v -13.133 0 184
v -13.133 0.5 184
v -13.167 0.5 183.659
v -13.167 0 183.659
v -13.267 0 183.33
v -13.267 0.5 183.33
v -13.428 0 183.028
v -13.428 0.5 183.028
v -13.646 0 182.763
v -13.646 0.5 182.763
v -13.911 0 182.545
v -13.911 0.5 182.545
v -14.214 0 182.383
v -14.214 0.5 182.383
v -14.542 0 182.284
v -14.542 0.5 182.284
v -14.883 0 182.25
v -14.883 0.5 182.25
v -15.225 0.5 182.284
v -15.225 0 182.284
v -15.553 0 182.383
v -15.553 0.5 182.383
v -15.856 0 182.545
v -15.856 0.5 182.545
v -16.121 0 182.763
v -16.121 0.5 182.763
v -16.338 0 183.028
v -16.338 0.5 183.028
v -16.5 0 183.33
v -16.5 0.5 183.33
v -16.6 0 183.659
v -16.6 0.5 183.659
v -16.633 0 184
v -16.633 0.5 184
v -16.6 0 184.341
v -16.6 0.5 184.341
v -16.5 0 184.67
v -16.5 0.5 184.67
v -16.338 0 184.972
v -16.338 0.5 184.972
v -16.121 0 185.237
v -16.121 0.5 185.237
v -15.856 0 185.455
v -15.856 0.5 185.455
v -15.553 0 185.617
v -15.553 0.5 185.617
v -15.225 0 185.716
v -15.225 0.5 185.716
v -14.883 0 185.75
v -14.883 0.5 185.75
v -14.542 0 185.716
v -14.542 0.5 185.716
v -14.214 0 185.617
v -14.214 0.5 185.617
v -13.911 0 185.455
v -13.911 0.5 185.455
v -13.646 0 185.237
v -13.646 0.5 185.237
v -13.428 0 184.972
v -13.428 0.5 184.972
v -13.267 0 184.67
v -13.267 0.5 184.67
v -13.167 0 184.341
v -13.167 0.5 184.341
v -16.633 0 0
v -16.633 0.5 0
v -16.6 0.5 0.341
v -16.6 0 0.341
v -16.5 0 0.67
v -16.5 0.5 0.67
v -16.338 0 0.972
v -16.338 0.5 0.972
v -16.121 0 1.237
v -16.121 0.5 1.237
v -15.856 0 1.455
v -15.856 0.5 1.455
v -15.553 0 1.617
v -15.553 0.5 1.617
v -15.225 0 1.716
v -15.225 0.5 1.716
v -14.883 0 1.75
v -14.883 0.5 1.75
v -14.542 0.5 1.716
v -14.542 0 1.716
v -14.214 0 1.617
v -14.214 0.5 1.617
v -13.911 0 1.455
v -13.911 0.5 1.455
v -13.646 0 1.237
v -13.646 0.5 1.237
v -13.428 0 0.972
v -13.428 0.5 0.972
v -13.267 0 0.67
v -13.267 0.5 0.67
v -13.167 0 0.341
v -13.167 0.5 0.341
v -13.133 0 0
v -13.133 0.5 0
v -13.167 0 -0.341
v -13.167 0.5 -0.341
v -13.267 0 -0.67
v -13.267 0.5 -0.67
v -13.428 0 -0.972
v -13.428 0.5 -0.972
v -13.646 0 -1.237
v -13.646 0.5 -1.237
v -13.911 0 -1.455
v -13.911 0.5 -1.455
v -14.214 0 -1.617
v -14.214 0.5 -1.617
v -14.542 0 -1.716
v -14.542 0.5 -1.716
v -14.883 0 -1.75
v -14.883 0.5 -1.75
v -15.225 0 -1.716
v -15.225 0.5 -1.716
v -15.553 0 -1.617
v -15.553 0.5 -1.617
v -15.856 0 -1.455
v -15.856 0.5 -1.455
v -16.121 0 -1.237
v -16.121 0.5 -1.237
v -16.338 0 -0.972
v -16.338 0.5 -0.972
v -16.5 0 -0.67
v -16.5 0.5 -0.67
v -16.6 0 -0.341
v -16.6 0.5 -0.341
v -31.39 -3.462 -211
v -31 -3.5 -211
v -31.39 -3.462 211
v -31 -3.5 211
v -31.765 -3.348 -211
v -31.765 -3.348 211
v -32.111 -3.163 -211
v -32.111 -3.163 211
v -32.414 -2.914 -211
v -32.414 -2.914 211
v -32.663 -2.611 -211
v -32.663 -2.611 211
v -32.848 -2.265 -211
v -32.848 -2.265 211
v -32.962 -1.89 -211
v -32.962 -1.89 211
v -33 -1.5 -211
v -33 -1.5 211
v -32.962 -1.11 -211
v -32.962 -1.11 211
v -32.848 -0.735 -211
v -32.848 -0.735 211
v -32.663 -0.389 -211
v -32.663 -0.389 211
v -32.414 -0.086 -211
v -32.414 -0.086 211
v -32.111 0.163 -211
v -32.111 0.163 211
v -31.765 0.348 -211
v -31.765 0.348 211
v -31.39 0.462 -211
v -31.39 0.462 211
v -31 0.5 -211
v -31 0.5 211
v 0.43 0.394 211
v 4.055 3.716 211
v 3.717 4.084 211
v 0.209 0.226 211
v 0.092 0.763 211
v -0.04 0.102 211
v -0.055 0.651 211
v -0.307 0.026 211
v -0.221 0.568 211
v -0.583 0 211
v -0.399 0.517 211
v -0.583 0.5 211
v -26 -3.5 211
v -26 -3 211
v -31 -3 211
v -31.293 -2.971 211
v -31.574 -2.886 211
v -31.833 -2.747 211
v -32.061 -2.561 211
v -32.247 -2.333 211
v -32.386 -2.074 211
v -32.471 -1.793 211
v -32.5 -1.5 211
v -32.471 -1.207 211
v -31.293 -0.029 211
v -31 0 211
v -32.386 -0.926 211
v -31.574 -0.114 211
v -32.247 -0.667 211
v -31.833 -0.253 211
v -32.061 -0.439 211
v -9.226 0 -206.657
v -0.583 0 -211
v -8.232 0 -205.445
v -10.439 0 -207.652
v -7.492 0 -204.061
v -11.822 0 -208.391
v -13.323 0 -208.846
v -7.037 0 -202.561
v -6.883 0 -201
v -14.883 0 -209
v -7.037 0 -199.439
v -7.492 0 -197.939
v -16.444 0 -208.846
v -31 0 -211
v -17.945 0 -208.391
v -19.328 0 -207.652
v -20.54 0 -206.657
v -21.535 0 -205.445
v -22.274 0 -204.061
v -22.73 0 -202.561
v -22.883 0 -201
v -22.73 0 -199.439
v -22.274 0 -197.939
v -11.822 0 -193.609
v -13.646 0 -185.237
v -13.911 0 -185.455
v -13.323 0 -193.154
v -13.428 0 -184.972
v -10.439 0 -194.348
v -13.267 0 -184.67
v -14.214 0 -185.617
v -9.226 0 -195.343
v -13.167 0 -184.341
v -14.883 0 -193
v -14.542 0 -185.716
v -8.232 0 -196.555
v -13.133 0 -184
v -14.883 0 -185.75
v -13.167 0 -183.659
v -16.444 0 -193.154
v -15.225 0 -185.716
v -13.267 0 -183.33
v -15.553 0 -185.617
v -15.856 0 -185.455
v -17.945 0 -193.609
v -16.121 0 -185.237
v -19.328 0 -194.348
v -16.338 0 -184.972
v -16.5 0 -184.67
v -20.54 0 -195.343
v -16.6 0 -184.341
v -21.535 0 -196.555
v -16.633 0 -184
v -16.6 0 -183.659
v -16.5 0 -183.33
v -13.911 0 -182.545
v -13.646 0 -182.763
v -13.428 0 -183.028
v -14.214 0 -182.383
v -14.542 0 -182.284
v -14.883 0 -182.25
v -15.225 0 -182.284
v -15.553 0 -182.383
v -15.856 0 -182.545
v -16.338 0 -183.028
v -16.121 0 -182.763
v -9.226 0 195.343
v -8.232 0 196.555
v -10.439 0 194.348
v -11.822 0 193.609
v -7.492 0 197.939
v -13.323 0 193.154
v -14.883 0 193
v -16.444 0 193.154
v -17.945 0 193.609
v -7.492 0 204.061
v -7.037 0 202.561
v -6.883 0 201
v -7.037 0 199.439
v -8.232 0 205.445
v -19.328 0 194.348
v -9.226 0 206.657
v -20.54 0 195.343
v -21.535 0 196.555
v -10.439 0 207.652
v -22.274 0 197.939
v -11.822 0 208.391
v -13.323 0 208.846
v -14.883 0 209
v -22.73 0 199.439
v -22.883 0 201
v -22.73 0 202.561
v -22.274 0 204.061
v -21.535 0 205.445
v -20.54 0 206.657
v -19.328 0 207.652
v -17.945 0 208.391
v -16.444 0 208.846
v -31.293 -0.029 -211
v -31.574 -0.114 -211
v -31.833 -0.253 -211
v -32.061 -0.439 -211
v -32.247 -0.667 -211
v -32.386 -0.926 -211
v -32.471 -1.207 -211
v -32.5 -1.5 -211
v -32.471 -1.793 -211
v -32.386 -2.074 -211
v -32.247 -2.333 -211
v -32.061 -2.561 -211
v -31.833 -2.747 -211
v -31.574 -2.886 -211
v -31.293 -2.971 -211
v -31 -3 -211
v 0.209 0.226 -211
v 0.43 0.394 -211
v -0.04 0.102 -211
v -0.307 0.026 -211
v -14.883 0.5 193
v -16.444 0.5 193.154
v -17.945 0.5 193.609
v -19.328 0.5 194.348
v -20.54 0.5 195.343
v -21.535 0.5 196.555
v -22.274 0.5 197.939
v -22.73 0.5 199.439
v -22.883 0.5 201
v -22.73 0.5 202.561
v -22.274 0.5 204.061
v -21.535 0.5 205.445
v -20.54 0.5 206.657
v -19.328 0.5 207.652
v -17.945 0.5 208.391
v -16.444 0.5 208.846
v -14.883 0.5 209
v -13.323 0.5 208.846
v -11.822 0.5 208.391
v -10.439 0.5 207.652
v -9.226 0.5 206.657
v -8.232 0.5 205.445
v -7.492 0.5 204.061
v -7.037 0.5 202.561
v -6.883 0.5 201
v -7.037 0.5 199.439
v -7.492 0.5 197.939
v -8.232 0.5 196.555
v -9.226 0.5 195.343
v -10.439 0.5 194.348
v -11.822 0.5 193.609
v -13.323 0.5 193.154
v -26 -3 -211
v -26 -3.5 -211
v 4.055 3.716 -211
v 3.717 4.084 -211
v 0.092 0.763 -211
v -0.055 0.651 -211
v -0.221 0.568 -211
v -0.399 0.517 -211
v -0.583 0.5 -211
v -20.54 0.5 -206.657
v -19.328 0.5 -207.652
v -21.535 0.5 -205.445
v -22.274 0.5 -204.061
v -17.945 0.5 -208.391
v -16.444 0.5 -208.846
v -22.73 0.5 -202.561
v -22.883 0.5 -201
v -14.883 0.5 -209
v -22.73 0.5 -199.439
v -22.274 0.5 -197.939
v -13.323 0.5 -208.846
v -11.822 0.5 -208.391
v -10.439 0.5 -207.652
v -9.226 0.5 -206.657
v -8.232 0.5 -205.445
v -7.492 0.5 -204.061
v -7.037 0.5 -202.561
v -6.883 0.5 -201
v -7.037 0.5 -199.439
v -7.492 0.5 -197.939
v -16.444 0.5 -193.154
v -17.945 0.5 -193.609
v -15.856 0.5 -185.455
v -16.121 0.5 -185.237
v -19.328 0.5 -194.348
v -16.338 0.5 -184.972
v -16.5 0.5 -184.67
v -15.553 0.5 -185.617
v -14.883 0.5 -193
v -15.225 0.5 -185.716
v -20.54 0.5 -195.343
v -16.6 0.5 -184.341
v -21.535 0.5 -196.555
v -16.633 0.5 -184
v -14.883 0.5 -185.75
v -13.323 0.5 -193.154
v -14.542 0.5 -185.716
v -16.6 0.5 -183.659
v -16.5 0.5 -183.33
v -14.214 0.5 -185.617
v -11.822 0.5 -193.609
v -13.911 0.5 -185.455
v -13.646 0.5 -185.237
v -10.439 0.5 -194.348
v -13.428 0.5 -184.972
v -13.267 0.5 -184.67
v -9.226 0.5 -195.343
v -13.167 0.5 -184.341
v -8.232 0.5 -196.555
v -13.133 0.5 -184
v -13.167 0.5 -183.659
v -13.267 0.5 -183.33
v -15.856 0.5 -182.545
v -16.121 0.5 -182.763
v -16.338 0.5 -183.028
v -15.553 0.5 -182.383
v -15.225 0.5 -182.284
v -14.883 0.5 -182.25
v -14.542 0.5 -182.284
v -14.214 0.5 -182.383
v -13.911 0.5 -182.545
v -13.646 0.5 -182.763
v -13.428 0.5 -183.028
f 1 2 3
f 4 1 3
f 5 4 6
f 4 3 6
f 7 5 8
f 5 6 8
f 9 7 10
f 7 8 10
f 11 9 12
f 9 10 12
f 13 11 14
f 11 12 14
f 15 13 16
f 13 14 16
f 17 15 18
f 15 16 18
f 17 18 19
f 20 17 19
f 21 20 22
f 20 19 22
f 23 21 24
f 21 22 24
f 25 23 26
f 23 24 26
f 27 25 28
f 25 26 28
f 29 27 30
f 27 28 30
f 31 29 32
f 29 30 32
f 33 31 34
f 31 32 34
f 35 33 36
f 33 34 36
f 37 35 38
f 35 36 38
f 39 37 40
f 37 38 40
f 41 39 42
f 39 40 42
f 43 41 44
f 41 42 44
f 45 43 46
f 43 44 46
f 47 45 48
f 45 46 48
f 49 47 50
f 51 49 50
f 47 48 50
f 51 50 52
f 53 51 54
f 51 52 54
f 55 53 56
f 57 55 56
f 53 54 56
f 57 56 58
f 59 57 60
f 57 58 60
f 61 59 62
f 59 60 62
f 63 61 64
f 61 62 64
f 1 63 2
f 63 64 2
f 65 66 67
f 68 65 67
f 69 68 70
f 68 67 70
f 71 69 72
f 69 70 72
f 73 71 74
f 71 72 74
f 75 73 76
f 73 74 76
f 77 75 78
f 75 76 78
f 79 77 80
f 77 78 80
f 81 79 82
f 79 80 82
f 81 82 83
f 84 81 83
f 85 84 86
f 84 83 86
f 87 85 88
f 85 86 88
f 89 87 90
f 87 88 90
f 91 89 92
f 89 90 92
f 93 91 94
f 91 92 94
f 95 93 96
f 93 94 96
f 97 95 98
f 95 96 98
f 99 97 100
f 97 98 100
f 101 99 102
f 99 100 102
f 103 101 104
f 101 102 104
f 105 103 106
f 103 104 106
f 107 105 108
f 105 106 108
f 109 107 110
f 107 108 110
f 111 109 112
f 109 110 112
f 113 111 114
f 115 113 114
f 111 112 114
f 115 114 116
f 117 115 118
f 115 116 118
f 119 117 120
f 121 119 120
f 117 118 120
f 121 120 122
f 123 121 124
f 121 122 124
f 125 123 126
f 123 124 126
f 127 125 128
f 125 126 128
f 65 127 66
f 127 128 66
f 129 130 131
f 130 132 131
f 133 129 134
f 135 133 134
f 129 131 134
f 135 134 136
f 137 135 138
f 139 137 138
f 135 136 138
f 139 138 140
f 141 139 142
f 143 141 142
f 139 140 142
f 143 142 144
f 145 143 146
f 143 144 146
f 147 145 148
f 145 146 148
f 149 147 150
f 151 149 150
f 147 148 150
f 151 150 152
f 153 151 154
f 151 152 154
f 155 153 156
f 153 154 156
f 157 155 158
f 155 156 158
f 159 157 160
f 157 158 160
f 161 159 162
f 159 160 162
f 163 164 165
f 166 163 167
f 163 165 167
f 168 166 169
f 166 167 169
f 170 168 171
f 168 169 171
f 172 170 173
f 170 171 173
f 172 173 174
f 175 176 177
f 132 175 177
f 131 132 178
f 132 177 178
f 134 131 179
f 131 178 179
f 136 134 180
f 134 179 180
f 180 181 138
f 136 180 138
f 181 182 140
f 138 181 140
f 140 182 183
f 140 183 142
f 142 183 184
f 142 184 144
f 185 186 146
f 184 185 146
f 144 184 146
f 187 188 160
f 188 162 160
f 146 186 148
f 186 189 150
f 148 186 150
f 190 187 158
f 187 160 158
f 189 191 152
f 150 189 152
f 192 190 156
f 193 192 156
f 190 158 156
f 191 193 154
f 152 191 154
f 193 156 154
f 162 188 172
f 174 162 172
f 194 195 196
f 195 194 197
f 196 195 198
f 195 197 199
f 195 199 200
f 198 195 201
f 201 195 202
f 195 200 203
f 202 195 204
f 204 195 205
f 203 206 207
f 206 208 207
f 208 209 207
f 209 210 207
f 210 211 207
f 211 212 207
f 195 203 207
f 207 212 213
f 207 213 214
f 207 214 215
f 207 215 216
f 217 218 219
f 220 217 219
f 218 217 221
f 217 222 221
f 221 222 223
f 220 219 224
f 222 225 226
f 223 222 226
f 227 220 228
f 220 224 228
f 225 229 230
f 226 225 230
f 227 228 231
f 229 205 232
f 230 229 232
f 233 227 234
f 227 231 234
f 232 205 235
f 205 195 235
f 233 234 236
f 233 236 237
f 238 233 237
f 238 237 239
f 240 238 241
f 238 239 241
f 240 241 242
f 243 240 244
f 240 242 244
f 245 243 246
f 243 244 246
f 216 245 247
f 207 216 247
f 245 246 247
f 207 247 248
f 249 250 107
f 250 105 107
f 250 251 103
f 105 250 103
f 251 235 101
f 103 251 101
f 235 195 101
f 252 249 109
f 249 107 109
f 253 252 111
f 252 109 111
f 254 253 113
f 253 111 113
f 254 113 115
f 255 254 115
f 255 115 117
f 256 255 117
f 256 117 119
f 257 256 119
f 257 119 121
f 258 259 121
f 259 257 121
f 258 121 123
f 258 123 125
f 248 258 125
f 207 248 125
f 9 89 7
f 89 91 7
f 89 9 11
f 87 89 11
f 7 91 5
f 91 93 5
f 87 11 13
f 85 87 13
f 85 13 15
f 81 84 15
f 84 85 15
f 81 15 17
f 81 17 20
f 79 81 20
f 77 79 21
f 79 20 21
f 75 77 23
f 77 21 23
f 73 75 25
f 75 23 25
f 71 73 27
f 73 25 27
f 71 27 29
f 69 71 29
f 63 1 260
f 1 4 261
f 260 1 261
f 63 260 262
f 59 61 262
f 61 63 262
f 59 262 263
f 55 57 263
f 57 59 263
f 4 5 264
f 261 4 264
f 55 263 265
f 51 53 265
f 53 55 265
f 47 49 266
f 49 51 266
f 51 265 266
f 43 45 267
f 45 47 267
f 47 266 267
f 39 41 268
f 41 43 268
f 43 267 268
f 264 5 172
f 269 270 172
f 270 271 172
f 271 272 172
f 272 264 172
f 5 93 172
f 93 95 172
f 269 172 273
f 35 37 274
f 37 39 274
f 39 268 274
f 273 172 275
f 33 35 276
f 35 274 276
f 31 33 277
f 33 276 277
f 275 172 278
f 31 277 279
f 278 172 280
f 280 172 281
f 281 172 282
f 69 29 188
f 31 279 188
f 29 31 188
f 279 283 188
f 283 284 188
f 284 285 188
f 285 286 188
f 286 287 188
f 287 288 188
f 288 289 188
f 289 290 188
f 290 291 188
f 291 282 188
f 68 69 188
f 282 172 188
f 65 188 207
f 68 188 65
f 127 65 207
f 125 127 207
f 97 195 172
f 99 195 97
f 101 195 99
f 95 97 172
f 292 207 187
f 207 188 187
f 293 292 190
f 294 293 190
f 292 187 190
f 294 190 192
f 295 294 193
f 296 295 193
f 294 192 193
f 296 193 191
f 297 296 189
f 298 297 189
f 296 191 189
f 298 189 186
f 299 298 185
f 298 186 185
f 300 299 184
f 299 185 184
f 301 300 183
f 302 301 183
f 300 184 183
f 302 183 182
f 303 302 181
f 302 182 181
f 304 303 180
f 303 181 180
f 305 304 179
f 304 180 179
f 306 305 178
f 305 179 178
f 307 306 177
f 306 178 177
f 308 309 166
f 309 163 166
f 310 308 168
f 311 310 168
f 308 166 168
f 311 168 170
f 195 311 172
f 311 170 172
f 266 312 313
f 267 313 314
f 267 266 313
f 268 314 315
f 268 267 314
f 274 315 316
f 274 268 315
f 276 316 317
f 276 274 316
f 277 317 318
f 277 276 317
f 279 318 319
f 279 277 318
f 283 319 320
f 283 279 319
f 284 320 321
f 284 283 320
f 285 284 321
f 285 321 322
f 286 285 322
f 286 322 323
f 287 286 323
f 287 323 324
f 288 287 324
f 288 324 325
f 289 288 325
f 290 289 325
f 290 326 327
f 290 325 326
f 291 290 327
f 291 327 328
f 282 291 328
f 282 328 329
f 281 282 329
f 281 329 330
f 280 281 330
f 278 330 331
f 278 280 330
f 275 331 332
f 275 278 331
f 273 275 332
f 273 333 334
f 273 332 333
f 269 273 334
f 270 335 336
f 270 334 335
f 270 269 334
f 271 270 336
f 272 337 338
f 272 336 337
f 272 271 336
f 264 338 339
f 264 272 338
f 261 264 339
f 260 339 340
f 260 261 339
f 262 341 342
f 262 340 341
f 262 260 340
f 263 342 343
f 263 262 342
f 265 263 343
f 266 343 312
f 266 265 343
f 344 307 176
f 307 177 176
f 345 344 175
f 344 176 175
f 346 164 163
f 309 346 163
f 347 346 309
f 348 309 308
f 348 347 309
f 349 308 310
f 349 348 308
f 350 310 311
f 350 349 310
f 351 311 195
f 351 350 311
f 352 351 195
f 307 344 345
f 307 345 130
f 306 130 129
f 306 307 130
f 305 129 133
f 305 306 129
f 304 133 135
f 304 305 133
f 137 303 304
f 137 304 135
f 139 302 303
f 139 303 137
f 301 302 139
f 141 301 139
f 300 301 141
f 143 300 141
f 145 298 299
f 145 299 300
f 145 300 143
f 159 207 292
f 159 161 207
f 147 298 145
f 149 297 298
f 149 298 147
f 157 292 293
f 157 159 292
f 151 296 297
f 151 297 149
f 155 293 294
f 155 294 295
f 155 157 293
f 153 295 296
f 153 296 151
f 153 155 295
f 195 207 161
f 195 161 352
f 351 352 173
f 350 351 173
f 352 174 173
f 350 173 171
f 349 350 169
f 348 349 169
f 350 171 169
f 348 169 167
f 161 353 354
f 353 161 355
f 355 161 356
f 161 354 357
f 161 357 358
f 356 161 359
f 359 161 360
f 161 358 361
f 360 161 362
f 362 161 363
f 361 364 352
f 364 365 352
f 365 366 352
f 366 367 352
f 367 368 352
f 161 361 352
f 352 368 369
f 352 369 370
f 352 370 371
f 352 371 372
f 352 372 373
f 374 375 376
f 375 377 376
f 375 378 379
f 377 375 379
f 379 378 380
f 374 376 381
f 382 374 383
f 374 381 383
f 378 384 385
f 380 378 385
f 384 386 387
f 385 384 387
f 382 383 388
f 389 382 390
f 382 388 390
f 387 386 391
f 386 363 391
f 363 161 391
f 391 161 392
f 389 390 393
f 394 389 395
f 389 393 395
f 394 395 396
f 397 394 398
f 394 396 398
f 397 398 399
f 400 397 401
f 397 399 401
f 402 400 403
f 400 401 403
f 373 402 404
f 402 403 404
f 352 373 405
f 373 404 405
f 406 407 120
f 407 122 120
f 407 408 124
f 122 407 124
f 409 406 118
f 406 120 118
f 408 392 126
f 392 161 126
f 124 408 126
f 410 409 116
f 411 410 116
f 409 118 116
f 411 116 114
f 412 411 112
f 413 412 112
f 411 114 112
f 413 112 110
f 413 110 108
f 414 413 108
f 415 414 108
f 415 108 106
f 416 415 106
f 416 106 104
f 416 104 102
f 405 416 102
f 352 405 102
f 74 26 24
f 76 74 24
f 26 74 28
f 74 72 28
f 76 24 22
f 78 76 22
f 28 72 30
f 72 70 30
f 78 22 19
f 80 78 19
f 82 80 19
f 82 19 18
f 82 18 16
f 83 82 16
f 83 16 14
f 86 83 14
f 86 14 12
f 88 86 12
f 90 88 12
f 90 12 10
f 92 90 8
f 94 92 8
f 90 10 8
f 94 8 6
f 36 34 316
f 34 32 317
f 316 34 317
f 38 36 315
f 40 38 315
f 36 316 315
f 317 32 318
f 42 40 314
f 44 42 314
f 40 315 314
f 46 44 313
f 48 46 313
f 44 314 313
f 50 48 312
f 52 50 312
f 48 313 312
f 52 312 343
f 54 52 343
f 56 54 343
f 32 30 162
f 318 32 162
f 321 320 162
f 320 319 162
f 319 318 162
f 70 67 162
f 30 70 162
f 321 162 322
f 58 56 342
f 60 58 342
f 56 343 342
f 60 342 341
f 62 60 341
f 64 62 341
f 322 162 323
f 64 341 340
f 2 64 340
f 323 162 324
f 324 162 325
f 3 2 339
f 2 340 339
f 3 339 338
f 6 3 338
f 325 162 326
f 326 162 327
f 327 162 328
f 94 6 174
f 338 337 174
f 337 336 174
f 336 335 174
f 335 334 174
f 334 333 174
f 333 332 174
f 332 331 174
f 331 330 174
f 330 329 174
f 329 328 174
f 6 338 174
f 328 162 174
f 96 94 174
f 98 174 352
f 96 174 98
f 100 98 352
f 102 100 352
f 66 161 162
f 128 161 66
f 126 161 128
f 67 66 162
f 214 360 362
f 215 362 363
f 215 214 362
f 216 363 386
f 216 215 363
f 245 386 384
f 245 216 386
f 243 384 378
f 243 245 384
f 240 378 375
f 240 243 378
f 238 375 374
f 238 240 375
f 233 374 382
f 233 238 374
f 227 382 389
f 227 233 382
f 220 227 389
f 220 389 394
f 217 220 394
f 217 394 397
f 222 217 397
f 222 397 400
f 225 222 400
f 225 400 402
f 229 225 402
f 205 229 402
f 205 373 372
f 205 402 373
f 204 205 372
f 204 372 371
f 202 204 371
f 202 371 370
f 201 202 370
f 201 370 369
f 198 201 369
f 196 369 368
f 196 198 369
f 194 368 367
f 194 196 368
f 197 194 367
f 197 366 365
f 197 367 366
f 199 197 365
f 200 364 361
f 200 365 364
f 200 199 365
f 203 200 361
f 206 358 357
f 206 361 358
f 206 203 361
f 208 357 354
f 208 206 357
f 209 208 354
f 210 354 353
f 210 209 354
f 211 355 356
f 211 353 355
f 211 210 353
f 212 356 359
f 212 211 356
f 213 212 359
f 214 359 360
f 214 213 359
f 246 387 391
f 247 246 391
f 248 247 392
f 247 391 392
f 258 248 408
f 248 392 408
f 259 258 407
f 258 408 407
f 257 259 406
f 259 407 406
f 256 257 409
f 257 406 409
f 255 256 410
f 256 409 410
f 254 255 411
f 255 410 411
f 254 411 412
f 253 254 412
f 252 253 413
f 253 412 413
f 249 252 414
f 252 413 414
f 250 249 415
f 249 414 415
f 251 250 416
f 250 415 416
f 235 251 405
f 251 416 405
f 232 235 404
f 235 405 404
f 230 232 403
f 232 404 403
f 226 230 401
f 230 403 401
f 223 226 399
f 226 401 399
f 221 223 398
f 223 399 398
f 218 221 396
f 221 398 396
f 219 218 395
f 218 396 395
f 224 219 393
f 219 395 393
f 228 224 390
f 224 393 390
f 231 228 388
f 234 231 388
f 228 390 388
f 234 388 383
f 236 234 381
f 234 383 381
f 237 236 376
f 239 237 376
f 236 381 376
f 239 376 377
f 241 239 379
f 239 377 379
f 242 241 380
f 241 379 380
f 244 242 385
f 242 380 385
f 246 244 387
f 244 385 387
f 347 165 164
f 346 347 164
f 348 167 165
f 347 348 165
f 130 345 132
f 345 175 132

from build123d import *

# Parameters (mm, degrees)
BASE_FLANGE1_DEPTH = 211
SKETCH2_R          = 8
EXTRUDE2_DEPTH     = 214.604031327
SKETCH3_R          = 1.75
EXTRUDE3_DEPTH     = 0.5
SKETCH4_R          = 1.75
EXTRUDE4_DEPTH     = 0.5


# Sheet-metal steps are written as plain solids
with BuildPart() as part:
    # Sketch1 → Base-Flange1 (new, symmetric)
    with BuildSketch(Plane.XY):
        with BuildLine():
            Line((4.055025352, 3.715746142), (0.430067214, 0.394083995))
            ThreePointArc((0.430067214, 0.394083995), (-0.03966104, 0.101988196), (-0.583318098, 0))
            Line((-0.583318098, 0), (-31, 0))
            ThreePointArc((-31, 0), (-32.5, -1.5), (-31, -3))
            Line((-31, -3), (-26, -3))
            Line((-26, -3), (-26, -3.5))
            Line((-26, -3.5), (-31, -3.5))
            ThreePointArc((-31, -3.5), (-33, -1.5), (-31, 0.5))
            Line((-31, 0.5), (-0.583318098, 0.5))
            ThreePointArc((-0.583318098, 0.5), (-0.220880059, 0.567992131), (0.09227211, 0.762722663))
            Line((0.09227211, 0.762722663), (3.717230249, 4.08438481))
            Line((3.717230249, 4.08438481), (4.055025352, 3.715746142))
        make_face()
    extrude(amount=BASE_FLANGE1_DEPTH, both=True)

    # Sketch2 → Extrude2 (cut, through all)
    with BuildSketch(Plane(origin=(0, 0, 0), x_dir=(1, 0, 0), z_dir=(0, 1, 0))):
        with Locations(Location((-14.883318098, 201, 0), (0, 0, 180))):
            Circle(SKETCH2_R)
        with Locations(Location((-14.883318098, -201, 0), (0, 0, 90))):
            Circle(SKETCH2_R)
    extrude(amount=EXTRUDE2_DEPTH, mode=Mode.SUBTRACT)

    # Sketch3 → Extrude3 (cut)
    with BuildSketch(Plane(origin=(0, 0.5, 0), x_dir=(1, 0, 0), z_dir=(0, 1, 0))):
        with Locations(Location((-14.883318098, 0, 0), (0, 0, 180))):
            Circle(SKETCH3_R)
    extrude(amount=-EXTRUDE3_DEPTH, mode=Mode.SUBTRACT)

    # Sketch4 → Extrude4 (cut)
    with BuildSketch(Plane(origin=(0, 0.5, 0), x_dir=(1, 0, 0), z_dir=(0, 1, 0))):
        with Locations(Location((-14.883318098, 184, 0), (0, 0, 180))):
            Circle(SKETCH4_R)
        with Locations((-14.883318098, -184)):
            Circle(SKETCH4_R)
    extrude(amount=-EXTRUDE4_DEPTH, mode=Mode.SUBTRACT)


solid = part.part
